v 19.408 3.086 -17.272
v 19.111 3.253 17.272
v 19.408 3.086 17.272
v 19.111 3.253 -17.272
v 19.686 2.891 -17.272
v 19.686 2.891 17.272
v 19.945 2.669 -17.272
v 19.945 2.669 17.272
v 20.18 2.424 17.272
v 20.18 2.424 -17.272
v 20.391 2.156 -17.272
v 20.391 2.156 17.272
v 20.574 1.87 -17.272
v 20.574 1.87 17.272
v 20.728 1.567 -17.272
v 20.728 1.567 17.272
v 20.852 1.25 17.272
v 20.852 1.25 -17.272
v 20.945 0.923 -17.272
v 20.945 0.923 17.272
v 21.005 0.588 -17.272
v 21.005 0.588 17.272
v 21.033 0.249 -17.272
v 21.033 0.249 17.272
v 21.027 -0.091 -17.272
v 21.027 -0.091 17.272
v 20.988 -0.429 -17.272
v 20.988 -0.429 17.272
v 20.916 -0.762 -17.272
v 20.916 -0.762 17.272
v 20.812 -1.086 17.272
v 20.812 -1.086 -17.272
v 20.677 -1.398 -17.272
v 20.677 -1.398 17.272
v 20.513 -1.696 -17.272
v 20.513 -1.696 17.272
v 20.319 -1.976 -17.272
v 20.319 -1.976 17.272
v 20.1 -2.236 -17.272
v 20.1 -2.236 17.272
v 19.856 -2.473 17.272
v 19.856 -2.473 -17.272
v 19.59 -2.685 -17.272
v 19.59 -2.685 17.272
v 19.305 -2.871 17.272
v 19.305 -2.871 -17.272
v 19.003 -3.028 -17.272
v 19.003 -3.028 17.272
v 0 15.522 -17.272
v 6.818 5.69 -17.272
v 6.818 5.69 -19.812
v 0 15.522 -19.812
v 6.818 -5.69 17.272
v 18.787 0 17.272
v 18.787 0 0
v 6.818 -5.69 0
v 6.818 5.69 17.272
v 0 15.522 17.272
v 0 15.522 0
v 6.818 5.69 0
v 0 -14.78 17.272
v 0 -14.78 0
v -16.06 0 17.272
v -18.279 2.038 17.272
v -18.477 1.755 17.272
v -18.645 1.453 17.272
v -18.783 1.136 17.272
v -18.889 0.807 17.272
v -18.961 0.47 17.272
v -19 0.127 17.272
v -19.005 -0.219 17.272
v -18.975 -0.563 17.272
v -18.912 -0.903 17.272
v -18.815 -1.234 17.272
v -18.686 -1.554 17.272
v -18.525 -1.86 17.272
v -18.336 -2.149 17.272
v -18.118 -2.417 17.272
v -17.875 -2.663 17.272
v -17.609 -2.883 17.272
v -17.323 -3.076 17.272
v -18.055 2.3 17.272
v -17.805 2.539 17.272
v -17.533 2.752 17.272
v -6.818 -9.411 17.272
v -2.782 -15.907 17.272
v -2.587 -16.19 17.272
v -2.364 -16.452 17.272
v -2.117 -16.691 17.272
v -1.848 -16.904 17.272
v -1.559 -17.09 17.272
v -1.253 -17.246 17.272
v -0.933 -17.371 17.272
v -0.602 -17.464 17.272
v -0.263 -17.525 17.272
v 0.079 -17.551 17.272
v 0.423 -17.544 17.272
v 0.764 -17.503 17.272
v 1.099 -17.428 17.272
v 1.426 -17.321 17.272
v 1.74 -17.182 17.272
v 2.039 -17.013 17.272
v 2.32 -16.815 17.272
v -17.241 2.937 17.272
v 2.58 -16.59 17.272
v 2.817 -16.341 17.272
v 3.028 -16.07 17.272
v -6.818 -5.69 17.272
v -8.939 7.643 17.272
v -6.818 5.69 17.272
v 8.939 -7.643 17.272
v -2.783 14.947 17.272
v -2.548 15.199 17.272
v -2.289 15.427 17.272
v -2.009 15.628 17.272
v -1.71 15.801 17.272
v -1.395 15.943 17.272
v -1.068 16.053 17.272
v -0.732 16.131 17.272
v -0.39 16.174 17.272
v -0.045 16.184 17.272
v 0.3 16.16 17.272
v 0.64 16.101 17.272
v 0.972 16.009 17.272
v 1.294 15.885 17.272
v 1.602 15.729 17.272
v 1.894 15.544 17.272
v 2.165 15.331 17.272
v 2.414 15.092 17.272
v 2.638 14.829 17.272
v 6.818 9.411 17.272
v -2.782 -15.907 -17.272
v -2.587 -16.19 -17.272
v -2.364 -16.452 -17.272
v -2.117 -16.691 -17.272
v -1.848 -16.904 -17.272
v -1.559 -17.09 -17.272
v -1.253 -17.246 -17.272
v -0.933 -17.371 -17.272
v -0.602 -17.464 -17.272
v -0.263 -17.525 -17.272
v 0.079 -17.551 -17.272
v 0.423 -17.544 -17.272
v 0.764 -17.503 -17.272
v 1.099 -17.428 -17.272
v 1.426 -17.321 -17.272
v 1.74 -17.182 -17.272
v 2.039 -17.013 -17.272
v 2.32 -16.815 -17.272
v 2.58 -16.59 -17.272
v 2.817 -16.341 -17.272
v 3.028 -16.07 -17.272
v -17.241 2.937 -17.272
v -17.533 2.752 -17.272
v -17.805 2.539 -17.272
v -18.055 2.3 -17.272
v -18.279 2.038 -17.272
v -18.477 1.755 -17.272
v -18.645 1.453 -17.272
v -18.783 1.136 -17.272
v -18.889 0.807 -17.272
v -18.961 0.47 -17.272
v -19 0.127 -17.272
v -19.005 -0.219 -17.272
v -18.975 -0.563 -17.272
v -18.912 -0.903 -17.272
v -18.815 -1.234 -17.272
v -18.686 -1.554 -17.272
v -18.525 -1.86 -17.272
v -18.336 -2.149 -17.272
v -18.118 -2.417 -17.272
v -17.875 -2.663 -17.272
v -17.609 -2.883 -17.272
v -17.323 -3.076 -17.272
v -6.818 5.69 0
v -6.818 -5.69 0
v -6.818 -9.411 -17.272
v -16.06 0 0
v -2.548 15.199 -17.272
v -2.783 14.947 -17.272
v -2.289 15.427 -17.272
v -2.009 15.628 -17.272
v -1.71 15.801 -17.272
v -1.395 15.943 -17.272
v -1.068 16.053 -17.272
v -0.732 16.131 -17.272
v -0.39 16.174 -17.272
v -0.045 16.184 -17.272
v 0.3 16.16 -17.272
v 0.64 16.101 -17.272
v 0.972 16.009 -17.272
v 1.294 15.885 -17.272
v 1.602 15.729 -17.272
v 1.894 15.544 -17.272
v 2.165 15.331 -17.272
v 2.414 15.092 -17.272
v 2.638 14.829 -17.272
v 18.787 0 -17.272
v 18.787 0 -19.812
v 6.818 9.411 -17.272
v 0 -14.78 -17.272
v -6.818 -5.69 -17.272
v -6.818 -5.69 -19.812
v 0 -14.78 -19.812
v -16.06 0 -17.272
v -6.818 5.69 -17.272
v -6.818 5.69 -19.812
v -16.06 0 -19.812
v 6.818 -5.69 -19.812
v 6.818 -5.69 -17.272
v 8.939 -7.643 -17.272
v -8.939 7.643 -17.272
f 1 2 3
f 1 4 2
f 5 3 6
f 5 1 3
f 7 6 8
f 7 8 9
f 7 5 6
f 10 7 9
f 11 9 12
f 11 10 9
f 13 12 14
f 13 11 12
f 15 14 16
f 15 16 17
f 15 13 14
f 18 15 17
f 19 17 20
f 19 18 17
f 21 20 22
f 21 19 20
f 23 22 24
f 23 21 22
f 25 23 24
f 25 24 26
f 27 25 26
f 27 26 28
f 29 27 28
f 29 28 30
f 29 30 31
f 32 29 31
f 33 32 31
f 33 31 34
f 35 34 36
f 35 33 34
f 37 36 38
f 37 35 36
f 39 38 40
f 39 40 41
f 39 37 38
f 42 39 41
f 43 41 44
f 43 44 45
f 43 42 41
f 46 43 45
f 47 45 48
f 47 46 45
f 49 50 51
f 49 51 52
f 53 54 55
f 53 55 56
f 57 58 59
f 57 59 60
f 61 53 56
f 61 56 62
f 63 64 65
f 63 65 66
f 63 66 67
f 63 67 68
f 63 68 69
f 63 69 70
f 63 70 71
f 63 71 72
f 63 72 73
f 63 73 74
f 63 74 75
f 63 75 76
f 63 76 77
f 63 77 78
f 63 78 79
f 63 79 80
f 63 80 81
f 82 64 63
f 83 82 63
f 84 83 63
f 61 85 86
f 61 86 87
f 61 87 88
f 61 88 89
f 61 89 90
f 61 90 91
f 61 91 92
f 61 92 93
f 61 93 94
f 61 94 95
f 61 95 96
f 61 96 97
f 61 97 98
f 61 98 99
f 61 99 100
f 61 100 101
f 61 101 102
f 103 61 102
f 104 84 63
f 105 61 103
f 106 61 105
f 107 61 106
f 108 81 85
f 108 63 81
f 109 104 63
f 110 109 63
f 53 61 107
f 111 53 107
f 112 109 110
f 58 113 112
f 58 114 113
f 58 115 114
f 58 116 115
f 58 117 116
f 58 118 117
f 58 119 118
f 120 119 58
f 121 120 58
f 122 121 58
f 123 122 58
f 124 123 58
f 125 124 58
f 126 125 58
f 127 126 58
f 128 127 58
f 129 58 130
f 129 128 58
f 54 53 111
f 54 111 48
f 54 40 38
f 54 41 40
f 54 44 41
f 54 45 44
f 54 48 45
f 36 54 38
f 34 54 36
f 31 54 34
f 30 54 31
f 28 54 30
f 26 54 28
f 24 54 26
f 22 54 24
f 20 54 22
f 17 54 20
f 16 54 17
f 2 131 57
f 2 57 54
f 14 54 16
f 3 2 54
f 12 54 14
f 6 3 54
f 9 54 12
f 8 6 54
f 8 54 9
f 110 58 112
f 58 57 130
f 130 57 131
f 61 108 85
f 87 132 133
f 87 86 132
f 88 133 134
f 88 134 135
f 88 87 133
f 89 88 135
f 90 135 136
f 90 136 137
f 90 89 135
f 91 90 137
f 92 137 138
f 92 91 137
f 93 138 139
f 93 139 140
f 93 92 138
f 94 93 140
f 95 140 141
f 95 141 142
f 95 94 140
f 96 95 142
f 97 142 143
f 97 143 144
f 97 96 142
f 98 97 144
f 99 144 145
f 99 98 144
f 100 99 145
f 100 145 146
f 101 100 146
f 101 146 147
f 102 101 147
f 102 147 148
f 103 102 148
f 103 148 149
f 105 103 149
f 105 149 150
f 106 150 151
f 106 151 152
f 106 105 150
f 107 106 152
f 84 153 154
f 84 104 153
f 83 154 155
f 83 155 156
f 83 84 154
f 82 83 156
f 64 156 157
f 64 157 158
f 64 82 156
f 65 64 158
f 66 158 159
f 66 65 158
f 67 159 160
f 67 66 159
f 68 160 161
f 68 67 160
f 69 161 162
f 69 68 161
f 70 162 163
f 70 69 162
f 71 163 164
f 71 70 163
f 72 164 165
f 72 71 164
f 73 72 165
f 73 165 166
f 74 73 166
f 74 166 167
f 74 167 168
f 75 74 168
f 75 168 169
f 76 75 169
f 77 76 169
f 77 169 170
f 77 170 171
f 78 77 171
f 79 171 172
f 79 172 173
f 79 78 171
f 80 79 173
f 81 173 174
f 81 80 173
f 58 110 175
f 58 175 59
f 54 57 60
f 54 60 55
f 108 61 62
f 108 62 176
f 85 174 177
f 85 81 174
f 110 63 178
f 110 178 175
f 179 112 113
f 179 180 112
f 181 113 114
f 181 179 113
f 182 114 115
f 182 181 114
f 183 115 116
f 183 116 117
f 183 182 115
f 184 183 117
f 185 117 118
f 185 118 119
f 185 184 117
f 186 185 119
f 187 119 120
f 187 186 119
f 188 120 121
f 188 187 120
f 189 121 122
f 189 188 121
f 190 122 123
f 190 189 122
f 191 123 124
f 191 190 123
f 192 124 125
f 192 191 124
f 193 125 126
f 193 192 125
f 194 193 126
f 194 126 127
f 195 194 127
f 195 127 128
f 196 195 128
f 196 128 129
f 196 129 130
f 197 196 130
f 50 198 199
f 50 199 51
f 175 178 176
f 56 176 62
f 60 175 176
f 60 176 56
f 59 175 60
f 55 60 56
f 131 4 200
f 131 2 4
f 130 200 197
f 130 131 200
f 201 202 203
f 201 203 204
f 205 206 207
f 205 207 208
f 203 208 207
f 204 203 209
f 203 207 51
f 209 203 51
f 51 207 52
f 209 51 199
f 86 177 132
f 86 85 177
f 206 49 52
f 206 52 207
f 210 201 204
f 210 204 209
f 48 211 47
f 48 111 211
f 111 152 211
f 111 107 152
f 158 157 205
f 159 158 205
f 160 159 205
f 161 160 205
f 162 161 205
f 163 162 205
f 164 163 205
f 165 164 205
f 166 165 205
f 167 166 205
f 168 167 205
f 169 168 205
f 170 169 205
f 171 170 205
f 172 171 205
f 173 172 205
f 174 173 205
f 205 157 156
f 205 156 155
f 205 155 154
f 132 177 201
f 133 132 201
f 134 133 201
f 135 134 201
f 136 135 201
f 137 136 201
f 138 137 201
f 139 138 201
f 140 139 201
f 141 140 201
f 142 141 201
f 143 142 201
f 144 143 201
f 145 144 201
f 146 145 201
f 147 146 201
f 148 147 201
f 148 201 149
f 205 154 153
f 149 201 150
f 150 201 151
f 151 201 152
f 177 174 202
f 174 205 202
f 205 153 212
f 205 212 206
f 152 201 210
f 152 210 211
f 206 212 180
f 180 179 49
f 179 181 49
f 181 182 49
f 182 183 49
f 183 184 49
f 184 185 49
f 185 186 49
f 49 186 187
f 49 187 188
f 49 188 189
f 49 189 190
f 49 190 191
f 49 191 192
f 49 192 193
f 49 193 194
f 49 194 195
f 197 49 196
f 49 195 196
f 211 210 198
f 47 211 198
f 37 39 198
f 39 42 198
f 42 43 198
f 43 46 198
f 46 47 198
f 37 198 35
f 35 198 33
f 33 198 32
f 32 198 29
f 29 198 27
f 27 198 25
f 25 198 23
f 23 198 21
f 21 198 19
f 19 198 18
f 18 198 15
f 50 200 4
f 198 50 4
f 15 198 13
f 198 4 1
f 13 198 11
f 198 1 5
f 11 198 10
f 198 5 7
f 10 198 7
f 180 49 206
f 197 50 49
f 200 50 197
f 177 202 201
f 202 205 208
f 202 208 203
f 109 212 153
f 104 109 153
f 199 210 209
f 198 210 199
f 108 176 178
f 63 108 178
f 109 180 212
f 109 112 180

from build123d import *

# Parameters (mm, degrees)
F1_DEPTH = 17.272
F2_DEPTH = 19.812
F3_R     = 3.483258


with BuildPart() as f1:
    # F0 (on Top) → F1 (new body, symmetric)
    with BuildSketch(Plane.XY):
        Polygon((0, 18.248798), (-8.939255, 7.643078), (-22.423375, 0), (-6.818111, -9.410581), (0, -20.386325), (8.939255, -7.643078), (25.605388, 0), (6.818111, 9.410581), align=None)
        Polygon((-16.059943, 0), (-6.818111, 5.689826), (0, 15.521614), (6.818111, 5.689826), (18.787423, 0), (6.818111, -5.689826), (0, -14.780444), (-6.818111, -5.689826), align=None, mode=Mode.SUBTRACT)
    extrude(amount=F1_DEPTH, both=True)

    # F0 (on Top) → F2 (join)
    with BuildSketch(Plane.XY):
        Polygon((0, 15.521614), (-6.818111, 5.689826), (-16.059943, 0), (-6.818111, -5.689826), (0, -14.780444), (6.818111, -5.689826), (18.787423, 0), (6.818111, 5.689826), align=None)
    extrude(amount=-F2_DEPTH)

    # F3
    f3_edges = [f1.edges().sort_by_distance(p)[0] for p in [
        (0, -20.386325, 0),
        (-22.423375, 0, 0),
        (0, 18.248798, 0),
        (25.605388, 0, 0),
    ]]
    fillet(f3_edges, radius=F3_R)


solid = f1.part
